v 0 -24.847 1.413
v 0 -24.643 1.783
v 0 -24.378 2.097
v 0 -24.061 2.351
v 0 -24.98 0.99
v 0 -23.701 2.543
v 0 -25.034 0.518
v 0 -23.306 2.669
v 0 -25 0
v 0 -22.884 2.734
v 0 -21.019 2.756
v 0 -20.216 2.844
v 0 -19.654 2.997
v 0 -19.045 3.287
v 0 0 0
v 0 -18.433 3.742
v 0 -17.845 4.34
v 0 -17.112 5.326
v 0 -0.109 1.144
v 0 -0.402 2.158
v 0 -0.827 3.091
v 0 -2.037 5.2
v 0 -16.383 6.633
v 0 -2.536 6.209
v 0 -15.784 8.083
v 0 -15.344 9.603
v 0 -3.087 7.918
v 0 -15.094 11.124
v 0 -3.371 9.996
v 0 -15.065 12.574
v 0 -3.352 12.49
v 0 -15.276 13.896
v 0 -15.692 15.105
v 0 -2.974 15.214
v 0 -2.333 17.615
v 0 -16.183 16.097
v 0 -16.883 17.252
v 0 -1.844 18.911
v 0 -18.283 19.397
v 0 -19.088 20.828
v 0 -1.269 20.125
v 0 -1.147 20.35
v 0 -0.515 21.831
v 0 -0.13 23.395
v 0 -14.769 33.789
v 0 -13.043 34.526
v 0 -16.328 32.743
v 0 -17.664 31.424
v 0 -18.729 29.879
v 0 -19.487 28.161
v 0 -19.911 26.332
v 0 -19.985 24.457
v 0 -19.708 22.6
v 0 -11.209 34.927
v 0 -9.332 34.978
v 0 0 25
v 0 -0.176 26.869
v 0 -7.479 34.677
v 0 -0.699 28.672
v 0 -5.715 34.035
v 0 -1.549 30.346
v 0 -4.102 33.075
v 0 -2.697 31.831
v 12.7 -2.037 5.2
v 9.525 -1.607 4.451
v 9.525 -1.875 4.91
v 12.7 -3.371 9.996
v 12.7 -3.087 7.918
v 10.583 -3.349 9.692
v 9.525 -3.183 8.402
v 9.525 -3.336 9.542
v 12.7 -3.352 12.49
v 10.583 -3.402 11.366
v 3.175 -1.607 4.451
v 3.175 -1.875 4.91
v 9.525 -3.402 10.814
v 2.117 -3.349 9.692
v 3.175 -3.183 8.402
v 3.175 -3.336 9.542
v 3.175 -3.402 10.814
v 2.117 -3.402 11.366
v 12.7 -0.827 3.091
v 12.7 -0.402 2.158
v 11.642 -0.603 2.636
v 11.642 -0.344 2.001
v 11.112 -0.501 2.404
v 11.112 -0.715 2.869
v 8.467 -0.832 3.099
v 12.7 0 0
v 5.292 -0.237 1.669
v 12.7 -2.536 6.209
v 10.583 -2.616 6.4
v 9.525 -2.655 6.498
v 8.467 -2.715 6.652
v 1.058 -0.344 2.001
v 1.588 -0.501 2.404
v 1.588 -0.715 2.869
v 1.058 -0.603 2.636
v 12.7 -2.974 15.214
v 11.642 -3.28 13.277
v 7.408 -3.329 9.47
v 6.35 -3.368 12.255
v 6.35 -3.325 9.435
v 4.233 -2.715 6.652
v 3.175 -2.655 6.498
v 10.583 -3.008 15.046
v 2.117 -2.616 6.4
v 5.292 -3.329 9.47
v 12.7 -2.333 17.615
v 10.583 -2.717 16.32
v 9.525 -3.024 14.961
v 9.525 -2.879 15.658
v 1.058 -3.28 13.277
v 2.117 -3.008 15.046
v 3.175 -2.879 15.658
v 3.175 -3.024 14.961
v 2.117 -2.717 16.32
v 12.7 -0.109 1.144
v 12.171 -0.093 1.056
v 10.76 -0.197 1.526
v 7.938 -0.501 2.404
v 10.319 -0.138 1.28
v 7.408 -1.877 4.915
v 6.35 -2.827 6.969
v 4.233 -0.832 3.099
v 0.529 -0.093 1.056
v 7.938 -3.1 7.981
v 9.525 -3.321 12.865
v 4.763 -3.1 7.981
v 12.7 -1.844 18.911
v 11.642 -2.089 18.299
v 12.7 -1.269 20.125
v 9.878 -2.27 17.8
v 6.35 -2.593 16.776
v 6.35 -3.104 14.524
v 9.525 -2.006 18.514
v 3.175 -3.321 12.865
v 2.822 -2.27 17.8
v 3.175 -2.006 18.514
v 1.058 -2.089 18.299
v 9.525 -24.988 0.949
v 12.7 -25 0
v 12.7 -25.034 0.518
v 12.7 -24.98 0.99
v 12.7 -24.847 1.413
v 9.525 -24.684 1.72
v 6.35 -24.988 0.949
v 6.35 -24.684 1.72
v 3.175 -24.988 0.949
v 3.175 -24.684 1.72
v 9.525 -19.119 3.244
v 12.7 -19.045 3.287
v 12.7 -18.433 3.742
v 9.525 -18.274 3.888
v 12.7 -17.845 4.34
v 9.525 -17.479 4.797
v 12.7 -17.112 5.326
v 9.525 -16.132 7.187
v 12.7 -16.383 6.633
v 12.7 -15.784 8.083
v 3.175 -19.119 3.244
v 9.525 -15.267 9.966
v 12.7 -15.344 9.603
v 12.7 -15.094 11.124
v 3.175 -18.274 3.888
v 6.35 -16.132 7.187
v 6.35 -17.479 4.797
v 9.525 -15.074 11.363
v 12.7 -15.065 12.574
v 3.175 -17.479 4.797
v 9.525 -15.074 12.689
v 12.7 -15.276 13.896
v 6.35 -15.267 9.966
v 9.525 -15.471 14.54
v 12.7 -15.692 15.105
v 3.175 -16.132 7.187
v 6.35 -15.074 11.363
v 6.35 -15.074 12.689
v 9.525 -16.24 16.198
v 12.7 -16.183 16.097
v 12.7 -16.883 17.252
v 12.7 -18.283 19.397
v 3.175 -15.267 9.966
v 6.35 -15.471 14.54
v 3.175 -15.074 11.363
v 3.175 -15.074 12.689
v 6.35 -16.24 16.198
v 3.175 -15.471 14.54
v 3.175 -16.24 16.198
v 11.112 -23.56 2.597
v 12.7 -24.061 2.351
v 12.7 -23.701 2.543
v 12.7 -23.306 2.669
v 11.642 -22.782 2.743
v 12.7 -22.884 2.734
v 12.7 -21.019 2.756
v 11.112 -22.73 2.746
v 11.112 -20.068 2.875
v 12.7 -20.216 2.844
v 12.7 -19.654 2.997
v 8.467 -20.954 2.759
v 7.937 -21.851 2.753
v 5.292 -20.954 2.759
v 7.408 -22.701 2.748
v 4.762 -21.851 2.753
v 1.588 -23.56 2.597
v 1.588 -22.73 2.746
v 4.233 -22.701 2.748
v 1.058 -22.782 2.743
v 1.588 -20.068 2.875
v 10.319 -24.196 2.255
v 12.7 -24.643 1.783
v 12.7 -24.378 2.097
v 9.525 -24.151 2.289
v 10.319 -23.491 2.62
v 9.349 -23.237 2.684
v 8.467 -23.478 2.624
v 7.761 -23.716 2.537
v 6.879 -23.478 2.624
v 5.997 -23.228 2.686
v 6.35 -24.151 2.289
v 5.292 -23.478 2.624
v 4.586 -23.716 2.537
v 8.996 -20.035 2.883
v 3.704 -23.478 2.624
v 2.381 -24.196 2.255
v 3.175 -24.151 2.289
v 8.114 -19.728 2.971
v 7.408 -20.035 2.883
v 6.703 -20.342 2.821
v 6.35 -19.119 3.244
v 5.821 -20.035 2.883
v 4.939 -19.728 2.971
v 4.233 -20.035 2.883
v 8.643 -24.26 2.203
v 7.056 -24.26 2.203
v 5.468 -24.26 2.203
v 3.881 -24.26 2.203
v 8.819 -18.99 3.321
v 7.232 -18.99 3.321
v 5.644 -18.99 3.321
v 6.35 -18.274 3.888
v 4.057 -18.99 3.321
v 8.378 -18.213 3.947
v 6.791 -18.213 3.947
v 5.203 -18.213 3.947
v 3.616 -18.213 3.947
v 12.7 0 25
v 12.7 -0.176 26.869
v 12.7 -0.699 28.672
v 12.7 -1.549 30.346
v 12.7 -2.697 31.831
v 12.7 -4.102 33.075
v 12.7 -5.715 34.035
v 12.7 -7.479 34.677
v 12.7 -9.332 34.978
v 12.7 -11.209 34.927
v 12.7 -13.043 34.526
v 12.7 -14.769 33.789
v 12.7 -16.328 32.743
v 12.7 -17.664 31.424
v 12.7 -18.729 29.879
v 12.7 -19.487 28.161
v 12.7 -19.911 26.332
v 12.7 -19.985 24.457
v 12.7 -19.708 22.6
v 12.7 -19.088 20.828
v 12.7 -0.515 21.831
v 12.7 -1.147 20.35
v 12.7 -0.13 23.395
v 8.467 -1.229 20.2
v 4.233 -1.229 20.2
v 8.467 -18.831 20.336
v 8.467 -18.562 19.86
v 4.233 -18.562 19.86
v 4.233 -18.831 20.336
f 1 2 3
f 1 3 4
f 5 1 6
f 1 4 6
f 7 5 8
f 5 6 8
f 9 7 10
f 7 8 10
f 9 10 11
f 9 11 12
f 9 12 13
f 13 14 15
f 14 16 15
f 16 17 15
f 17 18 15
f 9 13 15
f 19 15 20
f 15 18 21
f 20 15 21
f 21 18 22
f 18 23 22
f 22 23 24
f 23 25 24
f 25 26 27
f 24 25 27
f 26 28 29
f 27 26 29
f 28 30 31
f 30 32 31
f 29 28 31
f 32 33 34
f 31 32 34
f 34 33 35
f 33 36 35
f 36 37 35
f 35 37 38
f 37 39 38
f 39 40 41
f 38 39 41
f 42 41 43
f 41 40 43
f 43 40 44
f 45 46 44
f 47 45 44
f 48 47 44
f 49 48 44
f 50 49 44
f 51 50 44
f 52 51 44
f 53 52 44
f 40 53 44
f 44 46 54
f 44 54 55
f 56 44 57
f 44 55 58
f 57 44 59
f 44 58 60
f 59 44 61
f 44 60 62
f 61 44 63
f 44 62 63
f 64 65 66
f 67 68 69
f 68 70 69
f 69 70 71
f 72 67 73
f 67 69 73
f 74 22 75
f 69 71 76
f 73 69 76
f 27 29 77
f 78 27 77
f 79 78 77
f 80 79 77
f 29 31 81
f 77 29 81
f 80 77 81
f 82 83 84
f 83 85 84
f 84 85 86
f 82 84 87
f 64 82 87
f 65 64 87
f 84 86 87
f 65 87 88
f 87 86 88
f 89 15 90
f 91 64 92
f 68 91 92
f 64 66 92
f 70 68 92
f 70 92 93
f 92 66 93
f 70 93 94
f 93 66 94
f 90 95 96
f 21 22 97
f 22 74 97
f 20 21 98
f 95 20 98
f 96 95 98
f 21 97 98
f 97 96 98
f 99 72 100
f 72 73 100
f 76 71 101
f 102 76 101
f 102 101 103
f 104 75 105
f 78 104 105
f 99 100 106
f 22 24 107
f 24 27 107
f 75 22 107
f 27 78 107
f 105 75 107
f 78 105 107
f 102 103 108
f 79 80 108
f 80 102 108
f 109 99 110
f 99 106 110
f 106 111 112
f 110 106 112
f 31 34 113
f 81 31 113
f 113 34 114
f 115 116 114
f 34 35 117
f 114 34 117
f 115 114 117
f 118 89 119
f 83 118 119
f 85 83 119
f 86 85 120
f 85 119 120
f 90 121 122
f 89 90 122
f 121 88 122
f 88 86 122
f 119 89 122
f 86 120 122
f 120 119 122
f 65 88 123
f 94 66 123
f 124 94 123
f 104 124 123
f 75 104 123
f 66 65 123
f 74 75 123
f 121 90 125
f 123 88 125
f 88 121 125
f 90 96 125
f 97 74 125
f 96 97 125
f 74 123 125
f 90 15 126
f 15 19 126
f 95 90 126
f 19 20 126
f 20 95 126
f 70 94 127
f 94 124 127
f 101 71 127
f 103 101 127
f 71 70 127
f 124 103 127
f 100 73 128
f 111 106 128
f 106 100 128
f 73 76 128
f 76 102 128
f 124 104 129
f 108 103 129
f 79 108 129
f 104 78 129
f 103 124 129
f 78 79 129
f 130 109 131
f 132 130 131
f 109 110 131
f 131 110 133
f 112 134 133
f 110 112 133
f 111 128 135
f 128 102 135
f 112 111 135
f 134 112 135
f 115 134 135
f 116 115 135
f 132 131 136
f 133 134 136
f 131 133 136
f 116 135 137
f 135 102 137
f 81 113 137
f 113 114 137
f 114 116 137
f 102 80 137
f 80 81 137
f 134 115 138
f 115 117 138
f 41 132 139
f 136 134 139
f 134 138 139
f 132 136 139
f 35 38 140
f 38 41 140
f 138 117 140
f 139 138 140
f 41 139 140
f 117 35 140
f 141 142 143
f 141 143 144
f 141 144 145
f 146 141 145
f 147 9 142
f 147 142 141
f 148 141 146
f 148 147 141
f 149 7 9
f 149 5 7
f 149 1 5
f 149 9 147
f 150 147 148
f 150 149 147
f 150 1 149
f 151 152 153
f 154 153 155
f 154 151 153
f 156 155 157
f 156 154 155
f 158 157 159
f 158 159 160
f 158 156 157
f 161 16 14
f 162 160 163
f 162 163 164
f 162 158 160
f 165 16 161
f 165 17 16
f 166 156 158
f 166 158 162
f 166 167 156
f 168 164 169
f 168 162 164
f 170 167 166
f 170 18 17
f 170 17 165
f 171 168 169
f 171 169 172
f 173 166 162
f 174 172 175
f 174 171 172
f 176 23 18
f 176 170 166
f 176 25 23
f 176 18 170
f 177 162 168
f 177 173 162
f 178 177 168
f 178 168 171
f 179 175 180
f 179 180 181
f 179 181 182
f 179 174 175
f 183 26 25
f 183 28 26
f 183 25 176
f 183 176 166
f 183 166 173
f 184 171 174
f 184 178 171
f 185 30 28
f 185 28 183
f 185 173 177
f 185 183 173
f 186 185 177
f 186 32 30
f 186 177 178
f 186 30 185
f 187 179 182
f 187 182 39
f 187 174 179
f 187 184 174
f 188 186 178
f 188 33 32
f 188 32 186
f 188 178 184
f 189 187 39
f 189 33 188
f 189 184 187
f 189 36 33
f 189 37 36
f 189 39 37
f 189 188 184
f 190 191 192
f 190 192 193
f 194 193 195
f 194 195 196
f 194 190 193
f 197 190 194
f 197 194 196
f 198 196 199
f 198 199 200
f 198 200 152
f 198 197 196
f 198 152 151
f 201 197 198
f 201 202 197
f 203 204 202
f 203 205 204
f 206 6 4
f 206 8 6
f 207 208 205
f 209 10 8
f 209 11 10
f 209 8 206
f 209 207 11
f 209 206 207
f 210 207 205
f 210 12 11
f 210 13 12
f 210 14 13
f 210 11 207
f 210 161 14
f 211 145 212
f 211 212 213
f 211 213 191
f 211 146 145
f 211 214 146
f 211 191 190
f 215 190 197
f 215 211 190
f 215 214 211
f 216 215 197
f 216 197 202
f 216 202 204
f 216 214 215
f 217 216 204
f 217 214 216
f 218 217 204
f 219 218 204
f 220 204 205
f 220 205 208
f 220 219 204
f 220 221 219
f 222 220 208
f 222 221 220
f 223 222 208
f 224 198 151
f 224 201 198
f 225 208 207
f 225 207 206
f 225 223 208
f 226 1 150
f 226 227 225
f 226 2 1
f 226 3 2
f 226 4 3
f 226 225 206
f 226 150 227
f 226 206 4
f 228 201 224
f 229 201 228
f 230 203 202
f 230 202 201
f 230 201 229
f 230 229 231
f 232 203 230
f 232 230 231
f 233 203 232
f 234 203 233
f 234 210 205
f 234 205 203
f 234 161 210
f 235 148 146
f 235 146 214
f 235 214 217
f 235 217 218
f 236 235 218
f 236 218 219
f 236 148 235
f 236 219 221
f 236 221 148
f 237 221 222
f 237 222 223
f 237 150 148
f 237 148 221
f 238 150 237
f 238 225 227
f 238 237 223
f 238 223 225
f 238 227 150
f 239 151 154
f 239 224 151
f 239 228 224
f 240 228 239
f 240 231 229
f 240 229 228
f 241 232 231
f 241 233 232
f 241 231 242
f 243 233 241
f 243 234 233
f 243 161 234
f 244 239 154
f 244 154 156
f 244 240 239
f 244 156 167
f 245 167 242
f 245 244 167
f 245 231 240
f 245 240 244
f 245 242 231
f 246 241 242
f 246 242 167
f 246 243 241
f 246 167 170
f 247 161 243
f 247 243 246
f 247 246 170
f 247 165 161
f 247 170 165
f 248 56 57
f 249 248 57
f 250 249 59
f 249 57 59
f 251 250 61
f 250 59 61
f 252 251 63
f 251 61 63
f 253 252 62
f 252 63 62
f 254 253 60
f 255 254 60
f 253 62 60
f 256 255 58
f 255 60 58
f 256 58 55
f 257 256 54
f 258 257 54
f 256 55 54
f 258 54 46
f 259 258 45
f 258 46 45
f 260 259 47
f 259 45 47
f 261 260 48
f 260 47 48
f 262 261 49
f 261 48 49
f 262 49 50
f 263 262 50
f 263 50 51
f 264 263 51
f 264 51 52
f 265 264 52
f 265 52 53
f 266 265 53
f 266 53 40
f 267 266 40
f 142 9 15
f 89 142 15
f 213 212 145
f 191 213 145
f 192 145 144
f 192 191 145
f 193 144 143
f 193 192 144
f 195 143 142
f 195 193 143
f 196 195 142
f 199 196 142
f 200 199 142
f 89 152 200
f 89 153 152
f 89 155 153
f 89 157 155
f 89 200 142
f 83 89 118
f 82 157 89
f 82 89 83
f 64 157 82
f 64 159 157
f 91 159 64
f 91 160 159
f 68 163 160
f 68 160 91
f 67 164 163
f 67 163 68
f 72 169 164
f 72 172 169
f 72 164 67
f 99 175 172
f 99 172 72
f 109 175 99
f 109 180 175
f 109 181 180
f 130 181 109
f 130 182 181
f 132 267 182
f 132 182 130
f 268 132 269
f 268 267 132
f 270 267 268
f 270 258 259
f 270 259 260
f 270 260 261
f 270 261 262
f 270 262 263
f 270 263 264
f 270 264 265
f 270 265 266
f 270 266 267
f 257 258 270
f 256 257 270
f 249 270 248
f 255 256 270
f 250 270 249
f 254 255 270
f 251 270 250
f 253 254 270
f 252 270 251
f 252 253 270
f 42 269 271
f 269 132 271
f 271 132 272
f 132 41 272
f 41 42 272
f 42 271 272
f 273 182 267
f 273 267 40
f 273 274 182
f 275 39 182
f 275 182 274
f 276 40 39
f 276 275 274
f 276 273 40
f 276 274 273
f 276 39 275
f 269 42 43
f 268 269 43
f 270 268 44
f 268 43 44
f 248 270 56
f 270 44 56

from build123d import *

# Parameters (mm, degrees)
F1_DEPTH = 12.7


# Not quite as in the source:
# - a feature names something its author has since deleted; it is built from what else it names


with BuildPart() as f1:
    # F0 (on Right) → F1 (new body)
    with BuildSketch(Plane.YZ):
        with BuildLine():
            Line((-25, 0), (0, 0))
            add(Edge.make_bspline(
                [(0, 0), (0, 2.8664874844), (-4.4847679358, 6.1521378453), (-3.3497820964, 16.197657633), (-1.2690202208, 20.1245521133)],
                knots=[0, 0, 0, 0, 0.4275233277, 0.9891624175, 0.9891624175, 0.9891624175, 0.9891624175], degree=3))
            ThreePointArc((-1.2690202208, 20.1245521133), (-9.5726785605, 15.0091343525), (-18.2827975356, 19.3968522253))
            add(Edge.make_bspline(
                [(-25, 0), (-25.2065360546, 1.3745123288), (-23.5834985534, 3.4868467231), (-18.1413165506, 1.4671690224), (-13.2206567534, 12.9916001305), (-16.9008347887, 17.1648896009), (-18.2827975356, 19.3968522253)],
                knots=[0, 0, 0, 0, 0.1737603194, 0.3817412709, 0.7004550662, 0.949115937, 0.949115937, 0.949115937, 0.949115937], degree=3))
        make_face()
        with BuildLine():
            ThreePointArc((-18.2827975356, 19.3968522253), (-9.5726785605, 15.0091343525), (-1.2690202208, 20.1245521133))
            add(Edge.make_bspline(
                [(-1.2690202208, 20.1245521133), (-1.2288691187, 20.2003268299), (-1.1881832022, 20.2754399281), (-1.1469651688, 20.3498629828)],
                knots=[0.9891624175, 0.9891624175, 0.9891624175, 0.9891624175, 1, 1, 1, 1], degree=3))
            ThreePointArc((-1.1469651688, 20.3498629828), (-0.2909746032, 22.6052503588), (0, 25))
            ThreePointArc((0, 25), (-12.1351726564, 34.7693929047), (-19.0882075454, 20.82813188))
            add(Edge.make_bspline(
                [(-18.2827975356, 19.3968522253), (-18.5655918459, 19.853584024), (-18.8387159675, 20.3271892353), (-19.0882075454, 20.82813188)],
                knots=[0.949115937, 0.949115937, 0.949115937, 0.949115937, 1, 1, 1, 1], degree=3))
        make_face()
    extrude(amount=F1_DEPTH)


solid = f1.part
